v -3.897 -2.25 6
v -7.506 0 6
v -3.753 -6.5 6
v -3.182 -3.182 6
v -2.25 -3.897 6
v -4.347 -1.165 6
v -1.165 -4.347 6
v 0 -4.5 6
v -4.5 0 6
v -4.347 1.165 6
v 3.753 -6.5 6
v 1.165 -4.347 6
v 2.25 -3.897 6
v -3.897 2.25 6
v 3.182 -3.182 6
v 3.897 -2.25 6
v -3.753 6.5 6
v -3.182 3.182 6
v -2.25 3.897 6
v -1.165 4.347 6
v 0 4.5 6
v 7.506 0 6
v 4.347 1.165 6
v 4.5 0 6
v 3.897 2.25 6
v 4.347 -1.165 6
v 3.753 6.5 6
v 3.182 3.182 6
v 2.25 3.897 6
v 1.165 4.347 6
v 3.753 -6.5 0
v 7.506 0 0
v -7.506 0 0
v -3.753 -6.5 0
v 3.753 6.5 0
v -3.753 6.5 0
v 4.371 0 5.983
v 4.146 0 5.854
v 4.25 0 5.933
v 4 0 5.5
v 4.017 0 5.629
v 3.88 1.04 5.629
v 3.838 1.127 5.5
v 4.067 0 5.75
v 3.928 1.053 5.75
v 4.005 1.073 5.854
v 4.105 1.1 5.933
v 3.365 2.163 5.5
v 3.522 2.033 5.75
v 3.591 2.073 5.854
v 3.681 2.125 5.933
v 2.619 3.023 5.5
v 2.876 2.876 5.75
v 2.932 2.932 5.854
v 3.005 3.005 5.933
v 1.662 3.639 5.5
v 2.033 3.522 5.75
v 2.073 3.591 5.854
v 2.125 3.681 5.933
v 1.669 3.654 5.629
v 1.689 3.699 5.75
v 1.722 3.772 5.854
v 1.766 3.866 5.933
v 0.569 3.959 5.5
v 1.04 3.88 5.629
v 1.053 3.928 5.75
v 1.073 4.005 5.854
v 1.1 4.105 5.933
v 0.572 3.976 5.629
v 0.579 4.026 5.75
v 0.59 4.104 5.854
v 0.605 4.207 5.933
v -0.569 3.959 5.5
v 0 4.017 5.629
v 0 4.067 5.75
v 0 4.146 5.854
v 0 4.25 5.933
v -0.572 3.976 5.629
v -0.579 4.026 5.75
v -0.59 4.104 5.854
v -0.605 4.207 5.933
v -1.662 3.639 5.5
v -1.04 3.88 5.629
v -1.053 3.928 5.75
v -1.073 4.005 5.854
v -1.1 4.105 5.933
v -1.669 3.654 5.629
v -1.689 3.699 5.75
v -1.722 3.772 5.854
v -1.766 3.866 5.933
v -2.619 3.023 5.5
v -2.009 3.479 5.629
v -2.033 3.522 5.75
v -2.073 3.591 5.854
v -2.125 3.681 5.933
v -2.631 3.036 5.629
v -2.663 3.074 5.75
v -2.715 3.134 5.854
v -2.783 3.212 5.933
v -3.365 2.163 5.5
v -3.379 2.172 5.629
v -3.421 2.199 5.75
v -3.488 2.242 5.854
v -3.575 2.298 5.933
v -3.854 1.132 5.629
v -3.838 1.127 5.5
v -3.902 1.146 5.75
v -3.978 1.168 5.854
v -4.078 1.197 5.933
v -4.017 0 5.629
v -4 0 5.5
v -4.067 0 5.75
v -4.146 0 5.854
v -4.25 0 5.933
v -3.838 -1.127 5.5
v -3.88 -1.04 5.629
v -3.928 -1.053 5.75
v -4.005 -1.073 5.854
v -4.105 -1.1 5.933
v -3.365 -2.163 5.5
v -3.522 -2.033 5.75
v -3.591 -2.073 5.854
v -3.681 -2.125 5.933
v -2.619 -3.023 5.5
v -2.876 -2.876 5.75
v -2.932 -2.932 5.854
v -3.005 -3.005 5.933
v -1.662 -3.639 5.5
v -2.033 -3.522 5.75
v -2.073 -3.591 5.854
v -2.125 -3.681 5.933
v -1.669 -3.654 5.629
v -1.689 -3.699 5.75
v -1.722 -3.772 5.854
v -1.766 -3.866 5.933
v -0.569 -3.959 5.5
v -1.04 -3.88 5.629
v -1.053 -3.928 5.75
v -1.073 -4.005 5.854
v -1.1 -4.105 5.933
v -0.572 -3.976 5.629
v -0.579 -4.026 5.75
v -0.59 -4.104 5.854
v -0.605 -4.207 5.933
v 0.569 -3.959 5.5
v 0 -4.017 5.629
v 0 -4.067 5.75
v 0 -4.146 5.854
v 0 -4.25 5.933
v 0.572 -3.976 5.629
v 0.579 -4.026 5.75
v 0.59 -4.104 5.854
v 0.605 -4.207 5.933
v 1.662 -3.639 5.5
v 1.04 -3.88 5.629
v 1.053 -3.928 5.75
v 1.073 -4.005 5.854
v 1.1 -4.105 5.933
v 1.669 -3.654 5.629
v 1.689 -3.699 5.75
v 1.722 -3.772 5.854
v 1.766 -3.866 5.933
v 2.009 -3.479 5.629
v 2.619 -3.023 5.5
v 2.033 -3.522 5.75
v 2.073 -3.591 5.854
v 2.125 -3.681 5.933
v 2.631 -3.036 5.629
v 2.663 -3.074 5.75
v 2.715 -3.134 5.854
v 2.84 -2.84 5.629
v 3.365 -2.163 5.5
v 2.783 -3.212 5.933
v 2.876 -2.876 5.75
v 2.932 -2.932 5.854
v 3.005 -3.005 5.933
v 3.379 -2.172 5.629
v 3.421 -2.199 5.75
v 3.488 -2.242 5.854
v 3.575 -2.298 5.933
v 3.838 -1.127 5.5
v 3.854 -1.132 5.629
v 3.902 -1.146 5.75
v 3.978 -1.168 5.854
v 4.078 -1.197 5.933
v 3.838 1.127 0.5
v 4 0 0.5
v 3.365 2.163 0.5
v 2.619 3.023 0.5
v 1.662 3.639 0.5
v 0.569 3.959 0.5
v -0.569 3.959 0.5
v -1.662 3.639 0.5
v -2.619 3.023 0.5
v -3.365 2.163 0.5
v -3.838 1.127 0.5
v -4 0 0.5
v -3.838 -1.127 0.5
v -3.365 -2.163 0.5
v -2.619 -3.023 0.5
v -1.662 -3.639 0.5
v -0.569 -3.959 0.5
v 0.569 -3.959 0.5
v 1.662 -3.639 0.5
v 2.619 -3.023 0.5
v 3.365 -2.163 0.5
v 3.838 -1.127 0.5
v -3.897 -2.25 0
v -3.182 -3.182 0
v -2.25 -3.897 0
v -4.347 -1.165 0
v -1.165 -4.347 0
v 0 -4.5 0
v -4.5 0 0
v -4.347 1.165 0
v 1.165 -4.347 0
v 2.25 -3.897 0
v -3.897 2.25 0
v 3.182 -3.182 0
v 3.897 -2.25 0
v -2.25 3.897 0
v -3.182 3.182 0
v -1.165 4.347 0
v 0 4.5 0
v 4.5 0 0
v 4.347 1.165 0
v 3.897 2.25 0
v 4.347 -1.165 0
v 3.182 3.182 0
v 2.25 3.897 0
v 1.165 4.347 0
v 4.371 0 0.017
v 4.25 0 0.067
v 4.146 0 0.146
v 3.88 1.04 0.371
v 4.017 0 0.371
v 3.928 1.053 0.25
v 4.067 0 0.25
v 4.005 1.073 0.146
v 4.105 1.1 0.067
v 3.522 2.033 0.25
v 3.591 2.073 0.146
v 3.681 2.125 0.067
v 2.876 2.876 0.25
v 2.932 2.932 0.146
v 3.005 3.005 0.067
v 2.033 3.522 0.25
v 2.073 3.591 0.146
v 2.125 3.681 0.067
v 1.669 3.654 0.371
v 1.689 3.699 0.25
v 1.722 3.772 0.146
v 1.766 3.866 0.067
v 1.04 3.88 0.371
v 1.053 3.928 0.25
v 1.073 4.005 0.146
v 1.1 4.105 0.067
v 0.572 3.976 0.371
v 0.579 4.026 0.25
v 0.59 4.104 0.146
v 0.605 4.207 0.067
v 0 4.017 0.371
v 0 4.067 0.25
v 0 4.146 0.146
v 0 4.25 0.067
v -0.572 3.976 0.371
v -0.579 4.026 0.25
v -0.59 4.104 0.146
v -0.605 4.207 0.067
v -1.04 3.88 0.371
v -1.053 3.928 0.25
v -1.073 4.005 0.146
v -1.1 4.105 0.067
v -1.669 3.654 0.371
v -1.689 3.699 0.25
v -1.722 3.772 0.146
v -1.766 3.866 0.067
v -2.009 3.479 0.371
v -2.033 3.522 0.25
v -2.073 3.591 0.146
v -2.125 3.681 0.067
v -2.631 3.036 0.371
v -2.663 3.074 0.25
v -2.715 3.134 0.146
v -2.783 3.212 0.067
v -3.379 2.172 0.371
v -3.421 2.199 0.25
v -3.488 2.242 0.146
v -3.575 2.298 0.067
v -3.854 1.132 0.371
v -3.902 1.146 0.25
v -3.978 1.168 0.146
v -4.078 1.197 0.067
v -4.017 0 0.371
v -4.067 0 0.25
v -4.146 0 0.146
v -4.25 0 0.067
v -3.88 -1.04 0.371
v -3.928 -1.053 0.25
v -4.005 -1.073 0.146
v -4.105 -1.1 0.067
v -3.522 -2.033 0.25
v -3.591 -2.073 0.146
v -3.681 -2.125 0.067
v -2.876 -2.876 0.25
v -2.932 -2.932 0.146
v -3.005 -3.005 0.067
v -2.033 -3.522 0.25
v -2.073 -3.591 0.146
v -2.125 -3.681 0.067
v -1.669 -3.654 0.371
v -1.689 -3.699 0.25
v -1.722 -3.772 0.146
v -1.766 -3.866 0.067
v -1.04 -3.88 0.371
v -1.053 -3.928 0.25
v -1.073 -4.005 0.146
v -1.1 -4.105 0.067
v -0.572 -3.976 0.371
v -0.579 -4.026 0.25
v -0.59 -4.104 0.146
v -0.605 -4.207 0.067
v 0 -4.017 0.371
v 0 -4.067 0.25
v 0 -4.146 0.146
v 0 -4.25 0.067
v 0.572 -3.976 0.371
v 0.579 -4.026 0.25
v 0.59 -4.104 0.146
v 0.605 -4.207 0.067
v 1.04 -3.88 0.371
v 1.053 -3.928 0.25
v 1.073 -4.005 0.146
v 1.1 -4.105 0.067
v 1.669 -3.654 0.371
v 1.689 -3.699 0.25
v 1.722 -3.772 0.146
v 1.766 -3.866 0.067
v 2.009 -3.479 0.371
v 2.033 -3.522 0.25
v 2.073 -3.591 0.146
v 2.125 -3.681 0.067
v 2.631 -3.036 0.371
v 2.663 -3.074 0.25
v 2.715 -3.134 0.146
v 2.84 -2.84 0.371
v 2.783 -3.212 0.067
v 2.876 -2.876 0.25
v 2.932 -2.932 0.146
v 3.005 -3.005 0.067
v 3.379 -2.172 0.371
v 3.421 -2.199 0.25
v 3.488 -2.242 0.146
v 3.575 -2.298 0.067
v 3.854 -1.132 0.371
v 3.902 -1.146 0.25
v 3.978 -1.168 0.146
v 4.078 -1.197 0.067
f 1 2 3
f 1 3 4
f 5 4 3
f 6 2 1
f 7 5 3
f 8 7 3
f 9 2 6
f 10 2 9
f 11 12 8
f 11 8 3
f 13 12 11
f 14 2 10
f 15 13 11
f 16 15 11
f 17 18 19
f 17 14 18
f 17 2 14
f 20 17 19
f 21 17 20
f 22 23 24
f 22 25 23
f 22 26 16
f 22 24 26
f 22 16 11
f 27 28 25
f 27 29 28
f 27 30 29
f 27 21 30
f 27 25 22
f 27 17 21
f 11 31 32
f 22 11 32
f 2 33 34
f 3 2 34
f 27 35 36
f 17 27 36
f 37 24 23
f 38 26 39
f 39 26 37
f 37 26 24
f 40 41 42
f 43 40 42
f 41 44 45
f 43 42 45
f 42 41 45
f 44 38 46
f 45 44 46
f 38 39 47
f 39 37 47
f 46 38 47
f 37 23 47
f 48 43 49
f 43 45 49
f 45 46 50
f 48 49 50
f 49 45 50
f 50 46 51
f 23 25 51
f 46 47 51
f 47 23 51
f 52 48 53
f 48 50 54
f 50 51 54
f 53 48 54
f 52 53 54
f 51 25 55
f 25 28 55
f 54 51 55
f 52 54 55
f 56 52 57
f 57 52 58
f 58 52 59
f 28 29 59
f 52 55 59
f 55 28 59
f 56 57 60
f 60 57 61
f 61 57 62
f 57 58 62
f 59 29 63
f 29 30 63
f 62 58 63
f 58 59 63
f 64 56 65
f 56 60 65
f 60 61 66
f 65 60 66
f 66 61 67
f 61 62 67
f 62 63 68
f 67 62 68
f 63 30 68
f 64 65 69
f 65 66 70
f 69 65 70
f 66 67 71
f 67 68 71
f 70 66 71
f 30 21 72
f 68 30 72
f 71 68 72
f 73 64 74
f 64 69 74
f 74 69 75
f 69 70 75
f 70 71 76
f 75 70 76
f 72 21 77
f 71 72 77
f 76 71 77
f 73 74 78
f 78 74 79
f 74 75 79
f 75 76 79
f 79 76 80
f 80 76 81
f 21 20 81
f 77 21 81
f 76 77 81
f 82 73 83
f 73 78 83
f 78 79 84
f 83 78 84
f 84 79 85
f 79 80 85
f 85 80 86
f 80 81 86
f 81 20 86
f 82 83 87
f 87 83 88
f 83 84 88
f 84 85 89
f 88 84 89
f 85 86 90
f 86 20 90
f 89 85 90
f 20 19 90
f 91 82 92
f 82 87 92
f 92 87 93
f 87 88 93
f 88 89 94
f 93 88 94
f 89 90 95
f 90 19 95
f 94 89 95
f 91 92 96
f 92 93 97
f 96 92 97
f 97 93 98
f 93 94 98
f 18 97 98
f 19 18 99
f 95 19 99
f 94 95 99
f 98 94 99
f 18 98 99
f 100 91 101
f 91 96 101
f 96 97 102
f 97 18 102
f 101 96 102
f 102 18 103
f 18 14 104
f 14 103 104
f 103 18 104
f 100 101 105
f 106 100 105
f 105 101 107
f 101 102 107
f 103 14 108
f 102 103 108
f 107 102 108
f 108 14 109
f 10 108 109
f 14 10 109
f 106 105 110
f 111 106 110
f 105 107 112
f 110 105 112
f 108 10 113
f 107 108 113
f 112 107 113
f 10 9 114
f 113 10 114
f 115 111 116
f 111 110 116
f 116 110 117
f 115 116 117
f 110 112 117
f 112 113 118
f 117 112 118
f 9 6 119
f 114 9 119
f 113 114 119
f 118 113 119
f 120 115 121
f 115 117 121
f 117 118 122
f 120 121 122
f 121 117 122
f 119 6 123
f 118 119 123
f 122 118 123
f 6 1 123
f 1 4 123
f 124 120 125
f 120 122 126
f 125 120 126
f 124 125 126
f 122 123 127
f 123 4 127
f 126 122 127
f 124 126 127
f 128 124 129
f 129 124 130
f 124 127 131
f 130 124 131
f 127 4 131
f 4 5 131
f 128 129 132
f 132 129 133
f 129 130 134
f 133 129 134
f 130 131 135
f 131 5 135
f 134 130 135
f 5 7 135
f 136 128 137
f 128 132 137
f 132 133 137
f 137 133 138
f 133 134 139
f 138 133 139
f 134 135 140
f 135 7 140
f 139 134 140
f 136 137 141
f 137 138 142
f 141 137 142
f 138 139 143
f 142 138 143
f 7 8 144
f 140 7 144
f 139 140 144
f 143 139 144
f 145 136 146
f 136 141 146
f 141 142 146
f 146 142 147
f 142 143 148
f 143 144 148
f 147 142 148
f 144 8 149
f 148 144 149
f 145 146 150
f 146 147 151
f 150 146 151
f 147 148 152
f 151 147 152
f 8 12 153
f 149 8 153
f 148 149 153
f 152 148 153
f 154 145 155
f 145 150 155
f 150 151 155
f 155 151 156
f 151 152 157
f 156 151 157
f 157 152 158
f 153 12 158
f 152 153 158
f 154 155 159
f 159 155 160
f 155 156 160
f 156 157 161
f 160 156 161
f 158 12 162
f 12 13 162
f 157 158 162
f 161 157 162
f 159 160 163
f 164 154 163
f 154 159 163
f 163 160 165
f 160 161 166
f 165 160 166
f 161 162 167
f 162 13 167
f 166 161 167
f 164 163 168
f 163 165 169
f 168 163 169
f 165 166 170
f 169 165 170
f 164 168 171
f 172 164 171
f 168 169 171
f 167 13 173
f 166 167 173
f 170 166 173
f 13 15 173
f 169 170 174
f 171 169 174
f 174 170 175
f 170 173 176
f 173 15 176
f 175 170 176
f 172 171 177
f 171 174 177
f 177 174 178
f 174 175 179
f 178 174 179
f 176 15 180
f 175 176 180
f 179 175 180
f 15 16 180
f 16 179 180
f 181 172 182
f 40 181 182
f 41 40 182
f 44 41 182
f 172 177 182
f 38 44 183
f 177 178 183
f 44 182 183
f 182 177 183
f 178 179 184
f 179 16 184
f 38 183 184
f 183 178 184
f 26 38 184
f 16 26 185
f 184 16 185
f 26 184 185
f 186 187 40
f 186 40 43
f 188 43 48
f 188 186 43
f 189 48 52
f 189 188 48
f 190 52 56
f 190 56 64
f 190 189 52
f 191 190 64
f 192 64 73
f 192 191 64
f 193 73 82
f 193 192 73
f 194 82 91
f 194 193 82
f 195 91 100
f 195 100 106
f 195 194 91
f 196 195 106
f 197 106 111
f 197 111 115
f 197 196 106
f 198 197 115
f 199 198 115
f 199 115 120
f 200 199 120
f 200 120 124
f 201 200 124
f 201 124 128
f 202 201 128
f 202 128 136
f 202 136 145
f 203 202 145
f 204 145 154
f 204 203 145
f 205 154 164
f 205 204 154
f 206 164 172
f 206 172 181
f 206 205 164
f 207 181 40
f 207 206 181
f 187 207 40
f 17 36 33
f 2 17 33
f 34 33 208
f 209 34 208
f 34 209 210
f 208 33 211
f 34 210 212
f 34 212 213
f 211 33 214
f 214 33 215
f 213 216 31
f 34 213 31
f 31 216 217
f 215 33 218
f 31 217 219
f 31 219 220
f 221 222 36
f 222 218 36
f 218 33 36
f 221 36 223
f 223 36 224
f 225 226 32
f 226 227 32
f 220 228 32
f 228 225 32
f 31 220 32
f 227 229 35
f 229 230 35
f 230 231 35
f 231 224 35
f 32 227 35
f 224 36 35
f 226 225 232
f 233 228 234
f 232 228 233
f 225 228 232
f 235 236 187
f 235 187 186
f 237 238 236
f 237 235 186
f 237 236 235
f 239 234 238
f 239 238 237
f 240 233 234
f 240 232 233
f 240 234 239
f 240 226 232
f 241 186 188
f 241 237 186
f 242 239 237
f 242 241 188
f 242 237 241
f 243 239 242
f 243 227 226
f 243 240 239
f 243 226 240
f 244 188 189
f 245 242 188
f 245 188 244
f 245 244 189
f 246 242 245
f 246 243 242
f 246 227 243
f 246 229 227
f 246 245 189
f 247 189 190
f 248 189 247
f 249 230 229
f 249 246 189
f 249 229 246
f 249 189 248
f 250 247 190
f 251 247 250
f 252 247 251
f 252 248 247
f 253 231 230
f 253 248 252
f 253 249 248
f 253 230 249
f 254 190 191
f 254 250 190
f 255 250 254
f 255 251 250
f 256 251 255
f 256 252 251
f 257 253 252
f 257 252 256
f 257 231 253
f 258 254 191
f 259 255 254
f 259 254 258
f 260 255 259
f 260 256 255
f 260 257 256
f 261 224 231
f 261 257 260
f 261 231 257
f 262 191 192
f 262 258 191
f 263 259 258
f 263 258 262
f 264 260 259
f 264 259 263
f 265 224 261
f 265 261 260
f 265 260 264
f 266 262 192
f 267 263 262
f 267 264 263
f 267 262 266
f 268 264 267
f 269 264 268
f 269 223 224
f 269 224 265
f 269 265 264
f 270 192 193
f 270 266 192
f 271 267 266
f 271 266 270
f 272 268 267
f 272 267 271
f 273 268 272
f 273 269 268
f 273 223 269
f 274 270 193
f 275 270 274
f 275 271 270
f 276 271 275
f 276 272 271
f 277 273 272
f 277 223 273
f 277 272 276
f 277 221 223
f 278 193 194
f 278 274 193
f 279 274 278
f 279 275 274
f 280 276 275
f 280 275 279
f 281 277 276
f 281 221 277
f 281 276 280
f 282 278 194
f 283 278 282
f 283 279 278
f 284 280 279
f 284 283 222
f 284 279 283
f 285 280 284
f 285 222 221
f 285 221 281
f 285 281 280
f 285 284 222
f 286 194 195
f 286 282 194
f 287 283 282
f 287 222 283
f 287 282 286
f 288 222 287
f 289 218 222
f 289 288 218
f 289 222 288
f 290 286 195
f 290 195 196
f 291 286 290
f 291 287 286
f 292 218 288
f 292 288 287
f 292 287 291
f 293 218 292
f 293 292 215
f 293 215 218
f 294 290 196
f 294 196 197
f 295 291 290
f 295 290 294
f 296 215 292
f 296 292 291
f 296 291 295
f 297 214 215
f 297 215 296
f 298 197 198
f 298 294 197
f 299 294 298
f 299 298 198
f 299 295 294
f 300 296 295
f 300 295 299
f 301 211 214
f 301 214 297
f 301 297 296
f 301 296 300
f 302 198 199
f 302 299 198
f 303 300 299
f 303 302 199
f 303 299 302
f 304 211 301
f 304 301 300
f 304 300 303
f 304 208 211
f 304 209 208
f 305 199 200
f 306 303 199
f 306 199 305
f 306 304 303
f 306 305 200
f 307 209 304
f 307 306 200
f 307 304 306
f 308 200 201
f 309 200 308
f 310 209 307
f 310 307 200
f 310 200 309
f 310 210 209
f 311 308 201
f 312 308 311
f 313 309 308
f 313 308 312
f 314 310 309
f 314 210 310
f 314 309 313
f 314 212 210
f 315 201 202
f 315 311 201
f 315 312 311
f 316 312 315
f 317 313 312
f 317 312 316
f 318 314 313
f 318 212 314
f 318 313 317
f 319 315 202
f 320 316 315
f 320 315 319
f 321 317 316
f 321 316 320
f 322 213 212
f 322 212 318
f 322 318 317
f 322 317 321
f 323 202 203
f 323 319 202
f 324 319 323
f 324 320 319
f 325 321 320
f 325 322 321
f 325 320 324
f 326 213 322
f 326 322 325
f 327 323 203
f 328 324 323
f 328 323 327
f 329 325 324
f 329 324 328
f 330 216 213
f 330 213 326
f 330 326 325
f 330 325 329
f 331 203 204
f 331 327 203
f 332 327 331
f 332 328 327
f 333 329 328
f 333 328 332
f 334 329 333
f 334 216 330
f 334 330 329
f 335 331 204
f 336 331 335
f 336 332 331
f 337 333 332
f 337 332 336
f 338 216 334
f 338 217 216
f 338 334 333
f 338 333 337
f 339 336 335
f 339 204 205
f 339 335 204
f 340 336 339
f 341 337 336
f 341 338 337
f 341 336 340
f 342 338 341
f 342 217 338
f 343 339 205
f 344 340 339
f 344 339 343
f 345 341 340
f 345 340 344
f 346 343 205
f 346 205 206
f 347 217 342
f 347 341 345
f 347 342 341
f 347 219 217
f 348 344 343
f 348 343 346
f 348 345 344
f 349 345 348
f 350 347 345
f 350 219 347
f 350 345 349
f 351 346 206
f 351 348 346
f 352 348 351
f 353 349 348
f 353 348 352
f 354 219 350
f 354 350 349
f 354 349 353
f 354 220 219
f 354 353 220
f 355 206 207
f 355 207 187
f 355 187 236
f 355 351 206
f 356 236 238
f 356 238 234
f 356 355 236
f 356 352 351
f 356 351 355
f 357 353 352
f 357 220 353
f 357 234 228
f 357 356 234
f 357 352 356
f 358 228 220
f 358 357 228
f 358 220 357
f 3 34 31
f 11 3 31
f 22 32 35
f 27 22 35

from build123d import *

# Parameters (mm, degrees)
ESQUISSE1_R      = 4
EXTRUSION1_DEPTH = 6
CONG_1_R         = 0.5


with BuildPart() as part:
    # Esquisse1 → Extrusion1 (new body)
    with BuildSketch(Plane.XY):
        Polygon((7.505553499, 0), (3.75277675, 6.5), (-3.75277675, 6.5), (-7.505553499, 0), (-3.75277675, -6.5), (3.75277675, -6.5), align=None)
        Circle(ESQUISSE1_R, mode=Mode.SUBTRACT)
    extrude(amount=EXTRUSION1_DEPTH)

    # Congé1
    cong_1_edges = [part.edges().sort_by_distance(p)[0] for p in [
        (-4, 0, 0),
        (-4, 0, 6),
    ]]
    fillet(cong_1_edges, radius=CONG_1_R)


solid = part.part
